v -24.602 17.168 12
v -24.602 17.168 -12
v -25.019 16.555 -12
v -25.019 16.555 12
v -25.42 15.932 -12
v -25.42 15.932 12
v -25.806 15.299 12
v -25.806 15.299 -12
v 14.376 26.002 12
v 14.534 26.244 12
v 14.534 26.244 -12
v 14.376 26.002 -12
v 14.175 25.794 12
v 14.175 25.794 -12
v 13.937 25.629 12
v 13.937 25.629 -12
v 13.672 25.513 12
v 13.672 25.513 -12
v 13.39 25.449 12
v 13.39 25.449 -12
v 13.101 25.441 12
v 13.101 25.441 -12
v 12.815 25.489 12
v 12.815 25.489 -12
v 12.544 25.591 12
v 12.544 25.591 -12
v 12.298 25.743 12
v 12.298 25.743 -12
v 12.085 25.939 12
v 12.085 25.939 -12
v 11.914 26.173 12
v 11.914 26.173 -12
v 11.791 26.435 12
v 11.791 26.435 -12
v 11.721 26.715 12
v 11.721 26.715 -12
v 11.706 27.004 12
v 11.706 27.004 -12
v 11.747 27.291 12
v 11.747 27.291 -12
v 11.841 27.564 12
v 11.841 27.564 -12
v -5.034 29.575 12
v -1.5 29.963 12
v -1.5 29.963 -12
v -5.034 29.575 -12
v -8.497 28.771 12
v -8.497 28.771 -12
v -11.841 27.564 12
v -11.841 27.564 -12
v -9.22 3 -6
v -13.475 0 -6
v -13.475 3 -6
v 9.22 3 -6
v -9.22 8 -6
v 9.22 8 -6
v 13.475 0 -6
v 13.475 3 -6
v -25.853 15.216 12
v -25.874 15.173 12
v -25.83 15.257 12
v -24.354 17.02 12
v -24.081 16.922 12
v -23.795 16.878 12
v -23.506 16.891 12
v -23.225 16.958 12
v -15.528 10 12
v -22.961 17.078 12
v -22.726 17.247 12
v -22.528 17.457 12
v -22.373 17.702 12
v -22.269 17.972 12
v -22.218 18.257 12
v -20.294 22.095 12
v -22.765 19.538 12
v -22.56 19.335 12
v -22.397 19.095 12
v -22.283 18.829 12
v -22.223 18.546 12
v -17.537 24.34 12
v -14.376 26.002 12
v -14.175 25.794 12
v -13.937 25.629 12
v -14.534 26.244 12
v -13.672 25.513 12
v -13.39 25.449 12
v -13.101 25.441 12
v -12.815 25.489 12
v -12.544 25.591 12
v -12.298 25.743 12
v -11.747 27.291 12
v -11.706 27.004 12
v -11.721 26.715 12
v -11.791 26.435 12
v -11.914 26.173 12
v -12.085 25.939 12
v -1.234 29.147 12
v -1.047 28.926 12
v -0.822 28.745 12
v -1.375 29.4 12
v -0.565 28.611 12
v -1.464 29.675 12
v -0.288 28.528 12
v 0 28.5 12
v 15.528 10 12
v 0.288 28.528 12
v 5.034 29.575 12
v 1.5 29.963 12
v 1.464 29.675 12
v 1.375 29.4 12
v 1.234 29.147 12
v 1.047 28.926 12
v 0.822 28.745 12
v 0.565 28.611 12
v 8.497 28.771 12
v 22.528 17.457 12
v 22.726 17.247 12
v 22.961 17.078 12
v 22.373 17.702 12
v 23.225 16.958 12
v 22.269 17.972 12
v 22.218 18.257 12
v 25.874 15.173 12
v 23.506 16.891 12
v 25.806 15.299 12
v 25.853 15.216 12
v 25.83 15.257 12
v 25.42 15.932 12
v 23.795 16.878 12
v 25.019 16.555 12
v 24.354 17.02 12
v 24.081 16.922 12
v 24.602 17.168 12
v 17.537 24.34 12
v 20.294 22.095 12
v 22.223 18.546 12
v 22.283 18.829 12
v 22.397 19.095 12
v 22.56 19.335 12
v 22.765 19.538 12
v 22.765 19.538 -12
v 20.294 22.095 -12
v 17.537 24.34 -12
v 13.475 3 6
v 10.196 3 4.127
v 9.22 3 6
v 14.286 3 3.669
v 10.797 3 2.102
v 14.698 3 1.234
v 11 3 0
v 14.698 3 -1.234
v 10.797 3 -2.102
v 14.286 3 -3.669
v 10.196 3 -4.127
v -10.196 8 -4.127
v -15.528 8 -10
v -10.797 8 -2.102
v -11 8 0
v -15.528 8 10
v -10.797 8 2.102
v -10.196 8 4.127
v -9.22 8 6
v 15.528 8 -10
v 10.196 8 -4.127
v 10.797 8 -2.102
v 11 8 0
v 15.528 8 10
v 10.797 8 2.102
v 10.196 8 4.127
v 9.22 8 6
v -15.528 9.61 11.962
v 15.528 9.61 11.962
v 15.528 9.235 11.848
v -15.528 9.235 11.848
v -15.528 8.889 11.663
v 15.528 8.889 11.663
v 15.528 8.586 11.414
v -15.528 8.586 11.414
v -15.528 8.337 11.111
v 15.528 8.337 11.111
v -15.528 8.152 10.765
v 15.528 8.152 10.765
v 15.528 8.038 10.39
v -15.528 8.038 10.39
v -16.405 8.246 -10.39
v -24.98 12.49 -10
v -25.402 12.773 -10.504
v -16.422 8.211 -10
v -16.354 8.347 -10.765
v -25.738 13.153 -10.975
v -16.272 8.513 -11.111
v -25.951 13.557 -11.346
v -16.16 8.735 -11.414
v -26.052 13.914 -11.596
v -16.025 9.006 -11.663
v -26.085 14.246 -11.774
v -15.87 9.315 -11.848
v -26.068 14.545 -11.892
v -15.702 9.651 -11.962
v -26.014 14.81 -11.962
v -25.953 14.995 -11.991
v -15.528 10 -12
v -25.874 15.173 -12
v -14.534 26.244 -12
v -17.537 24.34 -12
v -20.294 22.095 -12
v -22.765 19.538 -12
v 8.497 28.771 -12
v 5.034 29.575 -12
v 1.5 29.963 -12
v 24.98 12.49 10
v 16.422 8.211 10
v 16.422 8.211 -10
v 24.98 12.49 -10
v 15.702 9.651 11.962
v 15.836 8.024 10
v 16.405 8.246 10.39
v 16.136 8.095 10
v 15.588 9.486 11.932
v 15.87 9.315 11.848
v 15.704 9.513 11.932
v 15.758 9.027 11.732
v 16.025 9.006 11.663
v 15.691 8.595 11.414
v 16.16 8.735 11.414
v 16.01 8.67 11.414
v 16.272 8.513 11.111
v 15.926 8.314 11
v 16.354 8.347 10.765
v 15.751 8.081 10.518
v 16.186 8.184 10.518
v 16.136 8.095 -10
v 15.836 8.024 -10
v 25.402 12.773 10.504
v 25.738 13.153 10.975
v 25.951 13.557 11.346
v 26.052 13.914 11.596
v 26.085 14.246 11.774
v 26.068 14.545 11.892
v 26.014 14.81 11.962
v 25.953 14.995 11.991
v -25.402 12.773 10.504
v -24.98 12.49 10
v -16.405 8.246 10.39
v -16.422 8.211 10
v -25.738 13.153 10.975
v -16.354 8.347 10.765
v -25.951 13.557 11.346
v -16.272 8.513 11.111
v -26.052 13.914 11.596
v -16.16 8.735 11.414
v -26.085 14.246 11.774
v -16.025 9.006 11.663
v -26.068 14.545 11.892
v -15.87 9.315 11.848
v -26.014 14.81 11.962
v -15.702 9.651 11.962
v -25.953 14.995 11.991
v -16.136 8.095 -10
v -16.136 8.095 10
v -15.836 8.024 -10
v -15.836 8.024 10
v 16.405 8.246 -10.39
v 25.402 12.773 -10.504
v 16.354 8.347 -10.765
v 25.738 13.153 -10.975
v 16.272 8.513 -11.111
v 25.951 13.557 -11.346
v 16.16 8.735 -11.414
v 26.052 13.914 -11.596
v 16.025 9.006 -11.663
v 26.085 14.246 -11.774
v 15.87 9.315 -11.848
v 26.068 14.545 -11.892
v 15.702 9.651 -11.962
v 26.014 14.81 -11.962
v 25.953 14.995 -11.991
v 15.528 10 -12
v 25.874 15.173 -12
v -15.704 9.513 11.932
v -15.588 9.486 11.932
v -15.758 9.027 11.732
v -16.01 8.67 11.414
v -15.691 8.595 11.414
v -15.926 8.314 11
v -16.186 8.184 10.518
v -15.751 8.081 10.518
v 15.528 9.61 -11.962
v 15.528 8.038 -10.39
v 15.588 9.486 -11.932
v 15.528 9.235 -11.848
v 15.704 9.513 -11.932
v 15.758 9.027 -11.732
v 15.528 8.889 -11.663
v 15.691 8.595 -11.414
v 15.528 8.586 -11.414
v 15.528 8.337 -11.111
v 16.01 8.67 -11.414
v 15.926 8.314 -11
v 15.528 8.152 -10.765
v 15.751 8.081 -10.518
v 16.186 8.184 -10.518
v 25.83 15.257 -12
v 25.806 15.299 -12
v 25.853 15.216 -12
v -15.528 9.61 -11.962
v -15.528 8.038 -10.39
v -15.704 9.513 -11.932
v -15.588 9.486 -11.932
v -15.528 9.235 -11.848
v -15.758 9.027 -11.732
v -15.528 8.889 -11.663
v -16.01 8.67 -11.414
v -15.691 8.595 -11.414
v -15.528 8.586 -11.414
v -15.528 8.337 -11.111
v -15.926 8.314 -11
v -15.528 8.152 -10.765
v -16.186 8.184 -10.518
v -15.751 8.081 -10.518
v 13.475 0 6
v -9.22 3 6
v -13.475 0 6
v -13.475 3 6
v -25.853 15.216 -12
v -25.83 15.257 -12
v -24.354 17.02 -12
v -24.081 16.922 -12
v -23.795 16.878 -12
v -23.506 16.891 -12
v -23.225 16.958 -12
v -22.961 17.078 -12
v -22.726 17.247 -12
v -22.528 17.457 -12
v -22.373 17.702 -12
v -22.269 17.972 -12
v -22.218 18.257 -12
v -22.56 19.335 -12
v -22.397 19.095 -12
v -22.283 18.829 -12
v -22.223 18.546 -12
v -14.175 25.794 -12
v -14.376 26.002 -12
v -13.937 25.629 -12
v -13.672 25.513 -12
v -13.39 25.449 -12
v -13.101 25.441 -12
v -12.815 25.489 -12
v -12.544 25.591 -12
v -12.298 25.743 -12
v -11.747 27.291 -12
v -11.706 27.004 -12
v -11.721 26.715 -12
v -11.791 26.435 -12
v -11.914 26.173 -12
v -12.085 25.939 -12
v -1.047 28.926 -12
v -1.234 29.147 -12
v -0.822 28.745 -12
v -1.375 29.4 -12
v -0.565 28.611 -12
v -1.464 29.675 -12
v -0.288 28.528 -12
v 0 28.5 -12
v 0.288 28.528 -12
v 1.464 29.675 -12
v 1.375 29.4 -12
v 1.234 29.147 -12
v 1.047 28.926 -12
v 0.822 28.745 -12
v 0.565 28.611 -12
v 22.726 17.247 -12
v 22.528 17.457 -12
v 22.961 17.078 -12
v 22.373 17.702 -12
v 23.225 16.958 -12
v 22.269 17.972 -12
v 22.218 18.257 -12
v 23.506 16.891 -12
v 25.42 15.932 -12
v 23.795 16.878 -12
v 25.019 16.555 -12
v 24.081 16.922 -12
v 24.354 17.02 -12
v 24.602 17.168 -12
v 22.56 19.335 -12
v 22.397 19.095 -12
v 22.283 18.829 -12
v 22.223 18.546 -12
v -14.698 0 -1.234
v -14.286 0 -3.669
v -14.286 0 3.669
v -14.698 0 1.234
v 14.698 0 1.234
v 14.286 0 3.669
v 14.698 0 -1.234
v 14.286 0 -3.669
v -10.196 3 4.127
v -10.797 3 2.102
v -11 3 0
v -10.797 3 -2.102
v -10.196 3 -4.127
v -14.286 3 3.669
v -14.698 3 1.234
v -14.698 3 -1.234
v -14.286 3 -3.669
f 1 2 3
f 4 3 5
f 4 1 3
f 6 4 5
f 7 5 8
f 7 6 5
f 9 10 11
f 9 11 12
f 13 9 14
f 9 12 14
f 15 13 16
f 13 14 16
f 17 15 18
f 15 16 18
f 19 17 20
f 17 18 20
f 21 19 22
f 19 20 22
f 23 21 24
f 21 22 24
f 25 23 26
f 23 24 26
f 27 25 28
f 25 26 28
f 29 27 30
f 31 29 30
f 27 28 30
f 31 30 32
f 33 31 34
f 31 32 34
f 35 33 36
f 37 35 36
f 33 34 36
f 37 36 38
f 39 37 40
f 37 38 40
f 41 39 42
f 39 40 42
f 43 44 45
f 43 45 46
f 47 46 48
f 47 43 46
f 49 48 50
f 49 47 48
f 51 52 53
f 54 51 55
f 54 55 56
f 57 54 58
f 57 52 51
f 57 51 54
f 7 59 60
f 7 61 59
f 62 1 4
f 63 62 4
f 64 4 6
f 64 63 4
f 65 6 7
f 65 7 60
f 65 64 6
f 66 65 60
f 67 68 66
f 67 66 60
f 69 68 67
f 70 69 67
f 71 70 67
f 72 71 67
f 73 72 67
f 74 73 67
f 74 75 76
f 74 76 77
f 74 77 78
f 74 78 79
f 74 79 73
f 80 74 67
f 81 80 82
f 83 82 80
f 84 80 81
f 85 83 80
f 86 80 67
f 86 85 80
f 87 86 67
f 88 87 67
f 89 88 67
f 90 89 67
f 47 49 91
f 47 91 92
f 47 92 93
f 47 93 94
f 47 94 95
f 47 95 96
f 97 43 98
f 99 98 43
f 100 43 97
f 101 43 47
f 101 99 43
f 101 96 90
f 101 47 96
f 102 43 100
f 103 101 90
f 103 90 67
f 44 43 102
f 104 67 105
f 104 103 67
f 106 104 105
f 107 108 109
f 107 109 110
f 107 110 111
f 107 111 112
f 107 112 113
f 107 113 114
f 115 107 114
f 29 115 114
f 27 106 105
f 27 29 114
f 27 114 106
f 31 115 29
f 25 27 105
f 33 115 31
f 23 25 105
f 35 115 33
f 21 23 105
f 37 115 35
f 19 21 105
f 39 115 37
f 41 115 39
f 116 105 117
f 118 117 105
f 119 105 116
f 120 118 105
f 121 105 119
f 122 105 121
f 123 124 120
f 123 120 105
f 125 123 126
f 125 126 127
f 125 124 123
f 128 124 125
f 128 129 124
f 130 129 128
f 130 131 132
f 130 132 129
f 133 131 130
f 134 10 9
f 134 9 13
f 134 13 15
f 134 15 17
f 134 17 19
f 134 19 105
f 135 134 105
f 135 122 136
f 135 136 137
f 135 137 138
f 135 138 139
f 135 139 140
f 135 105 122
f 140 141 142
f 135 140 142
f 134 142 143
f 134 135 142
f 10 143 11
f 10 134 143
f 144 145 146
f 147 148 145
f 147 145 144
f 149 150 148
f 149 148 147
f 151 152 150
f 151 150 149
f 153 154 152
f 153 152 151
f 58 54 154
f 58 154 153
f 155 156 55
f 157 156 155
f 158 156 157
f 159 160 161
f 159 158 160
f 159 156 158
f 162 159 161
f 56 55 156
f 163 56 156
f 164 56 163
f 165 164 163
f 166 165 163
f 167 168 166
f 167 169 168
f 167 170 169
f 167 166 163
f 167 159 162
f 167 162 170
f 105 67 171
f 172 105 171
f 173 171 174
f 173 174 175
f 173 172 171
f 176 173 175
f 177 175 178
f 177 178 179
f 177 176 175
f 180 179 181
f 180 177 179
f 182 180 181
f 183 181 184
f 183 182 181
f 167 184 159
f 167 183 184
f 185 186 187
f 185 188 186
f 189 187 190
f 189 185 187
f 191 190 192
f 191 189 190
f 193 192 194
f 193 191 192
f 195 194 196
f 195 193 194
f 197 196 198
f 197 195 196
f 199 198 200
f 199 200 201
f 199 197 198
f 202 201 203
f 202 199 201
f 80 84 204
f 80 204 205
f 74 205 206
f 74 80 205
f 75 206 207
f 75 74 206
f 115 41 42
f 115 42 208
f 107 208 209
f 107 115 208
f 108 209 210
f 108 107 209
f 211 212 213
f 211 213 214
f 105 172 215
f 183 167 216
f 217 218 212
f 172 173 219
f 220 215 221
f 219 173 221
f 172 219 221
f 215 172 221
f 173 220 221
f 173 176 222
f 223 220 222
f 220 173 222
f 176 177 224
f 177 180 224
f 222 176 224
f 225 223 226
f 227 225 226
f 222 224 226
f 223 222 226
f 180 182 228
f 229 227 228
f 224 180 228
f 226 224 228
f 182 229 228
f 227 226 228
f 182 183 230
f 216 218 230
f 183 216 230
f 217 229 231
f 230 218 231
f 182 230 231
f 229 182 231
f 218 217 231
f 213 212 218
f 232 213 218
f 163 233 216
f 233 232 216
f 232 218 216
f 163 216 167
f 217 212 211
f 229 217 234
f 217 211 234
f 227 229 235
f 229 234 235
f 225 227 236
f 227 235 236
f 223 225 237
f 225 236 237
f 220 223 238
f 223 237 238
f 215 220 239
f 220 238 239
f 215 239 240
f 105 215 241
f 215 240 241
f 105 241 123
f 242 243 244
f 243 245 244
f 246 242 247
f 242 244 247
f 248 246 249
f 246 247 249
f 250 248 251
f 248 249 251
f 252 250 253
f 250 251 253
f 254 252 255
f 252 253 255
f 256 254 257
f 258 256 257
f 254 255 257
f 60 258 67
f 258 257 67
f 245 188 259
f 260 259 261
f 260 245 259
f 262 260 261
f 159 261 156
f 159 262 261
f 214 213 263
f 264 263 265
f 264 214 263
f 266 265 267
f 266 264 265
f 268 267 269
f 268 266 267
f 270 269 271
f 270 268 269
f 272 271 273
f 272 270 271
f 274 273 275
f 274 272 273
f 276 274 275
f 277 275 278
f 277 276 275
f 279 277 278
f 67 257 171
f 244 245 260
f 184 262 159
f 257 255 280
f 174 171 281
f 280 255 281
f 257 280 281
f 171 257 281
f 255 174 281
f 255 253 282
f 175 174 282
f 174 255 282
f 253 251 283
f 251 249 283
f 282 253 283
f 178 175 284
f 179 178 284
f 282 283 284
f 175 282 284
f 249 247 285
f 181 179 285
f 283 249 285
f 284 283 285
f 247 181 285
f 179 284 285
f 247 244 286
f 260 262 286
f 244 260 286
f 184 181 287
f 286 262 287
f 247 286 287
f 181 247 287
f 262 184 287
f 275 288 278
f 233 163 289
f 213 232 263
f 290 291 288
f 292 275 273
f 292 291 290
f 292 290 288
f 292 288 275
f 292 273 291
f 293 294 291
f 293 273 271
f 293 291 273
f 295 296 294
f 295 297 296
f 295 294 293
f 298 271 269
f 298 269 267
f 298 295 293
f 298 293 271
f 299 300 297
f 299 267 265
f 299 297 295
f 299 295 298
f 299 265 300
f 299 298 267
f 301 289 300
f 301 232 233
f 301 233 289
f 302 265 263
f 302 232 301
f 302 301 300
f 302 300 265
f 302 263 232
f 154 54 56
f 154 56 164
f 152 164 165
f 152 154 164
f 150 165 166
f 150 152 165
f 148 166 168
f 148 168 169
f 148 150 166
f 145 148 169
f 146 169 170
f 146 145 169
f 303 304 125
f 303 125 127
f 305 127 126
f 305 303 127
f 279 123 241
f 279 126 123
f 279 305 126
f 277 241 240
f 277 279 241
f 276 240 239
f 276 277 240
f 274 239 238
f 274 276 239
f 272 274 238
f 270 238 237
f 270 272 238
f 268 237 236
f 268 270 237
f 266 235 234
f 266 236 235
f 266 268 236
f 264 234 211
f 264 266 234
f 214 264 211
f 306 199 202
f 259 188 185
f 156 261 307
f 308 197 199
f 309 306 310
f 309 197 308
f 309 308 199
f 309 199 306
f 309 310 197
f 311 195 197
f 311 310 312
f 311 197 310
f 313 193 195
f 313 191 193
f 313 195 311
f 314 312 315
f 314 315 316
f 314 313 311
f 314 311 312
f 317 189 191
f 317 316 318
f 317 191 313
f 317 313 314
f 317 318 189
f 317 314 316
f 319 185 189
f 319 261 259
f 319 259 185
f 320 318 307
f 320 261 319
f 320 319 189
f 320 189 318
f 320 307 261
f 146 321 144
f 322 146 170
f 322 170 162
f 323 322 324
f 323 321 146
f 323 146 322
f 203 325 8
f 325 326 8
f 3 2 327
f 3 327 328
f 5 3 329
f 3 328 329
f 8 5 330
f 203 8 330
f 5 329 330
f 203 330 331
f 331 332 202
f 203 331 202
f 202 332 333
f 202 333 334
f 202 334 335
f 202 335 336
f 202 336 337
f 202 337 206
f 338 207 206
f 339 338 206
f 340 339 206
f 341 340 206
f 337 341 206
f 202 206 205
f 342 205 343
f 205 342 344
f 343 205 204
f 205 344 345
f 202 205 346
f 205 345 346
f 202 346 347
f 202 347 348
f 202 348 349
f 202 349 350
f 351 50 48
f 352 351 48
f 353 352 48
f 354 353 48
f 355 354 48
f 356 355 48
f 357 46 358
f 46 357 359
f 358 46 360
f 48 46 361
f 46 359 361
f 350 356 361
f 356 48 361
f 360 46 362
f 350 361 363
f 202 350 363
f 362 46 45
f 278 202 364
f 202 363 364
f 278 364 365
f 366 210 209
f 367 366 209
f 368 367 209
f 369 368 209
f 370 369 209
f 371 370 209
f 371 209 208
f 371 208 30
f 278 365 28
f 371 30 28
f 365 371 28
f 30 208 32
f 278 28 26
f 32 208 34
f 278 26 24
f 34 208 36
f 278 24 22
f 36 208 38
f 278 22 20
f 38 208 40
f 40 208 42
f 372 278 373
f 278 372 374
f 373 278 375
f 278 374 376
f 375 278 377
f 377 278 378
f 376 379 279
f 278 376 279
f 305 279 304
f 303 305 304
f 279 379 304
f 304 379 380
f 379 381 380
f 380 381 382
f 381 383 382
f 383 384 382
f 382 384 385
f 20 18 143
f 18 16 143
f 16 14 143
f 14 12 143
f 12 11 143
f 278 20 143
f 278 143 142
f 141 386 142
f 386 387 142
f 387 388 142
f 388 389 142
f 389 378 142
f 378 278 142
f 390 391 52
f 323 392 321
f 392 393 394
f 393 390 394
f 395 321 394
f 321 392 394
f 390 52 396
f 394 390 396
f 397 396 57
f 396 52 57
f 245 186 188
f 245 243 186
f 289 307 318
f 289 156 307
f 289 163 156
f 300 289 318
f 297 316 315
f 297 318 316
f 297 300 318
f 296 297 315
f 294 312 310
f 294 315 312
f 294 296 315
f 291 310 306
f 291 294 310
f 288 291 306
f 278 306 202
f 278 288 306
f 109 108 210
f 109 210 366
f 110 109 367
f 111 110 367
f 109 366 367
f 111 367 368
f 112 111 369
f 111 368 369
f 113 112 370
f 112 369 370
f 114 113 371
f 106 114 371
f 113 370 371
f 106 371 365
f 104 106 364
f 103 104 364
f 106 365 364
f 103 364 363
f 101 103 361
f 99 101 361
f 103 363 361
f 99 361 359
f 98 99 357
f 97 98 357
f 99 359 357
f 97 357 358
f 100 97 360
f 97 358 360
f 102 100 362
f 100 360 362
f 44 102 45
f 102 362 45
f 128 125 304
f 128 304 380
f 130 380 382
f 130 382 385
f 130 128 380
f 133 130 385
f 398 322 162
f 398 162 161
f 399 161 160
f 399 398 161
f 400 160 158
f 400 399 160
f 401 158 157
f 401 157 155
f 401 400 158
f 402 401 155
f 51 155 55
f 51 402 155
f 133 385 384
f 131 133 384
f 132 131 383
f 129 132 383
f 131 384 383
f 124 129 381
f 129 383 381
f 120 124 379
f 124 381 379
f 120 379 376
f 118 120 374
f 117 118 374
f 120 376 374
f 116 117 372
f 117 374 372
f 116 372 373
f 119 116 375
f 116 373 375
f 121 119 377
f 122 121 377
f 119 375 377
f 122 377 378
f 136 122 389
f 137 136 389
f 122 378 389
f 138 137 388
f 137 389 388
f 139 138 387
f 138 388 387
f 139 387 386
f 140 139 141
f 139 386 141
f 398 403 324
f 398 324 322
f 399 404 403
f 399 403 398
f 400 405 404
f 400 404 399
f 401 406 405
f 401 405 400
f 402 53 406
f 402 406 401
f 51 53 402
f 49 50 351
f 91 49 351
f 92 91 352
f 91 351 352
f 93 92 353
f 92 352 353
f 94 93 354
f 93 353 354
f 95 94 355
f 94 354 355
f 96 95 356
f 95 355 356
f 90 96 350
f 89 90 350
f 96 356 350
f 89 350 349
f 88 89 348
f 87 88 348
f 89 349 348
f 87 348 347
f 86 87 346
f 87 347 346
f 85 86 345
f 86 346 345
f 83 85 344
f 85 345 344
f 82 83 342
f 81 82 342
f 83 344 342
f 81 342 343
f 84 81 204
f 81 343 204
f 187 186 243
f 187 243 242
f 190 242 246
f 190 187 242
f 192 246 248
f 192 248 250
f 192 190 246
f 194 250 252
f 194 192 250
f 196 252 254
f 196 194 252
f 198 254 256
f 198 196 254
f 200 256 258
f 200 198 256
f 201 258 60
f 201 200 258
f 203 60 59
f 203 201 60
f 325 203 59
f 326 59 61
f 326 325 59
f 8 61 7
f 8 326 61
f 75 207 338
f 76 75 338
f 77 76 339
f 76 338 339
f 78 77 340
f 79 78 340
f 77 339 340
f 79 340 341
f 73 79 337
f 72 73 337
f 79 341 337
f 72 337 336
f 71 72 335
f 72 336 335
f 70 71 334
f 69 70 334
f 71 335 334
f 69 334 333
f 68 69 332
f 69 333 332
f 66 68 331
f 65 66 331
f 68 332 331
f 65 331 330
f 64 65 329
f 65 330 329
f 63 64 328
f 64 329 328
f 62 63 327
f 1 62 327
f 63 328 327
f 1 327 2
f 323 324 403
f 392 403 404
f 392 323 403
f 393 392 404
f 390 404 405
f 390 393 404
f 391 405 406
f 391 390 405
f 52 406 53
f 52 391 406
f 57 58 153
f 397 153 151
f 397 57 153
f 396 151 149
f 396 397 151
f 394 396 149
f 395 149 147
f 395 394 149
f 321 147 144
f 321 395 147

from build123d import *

# Parameters (mm, degrees)
SKETCH1_W           = 29.5
SKETCH1_H           = 12
BOSS_EXTRUDE1_DEPTH = 3
BOSS_EXTRUDE7_DEPTH = 12
BOSS_EXTRUDE8_DEPTH = 5
SKETCH16_R          = 1.5
CUT_EXTRUDE11_DEPTH = 24
FILLET5_R           = 2
SKETCH17_OUTSIDE_W  = 67.126
SKETCH17_OUTSIDE_H  = 38.954
SKETCH17_OUTSIDE_R  = 14.75
CUT_EXTRUDE12_DEPTH = 3


with BuildPart() as part:
    # Sketch1 → Boss-Extrude1 (new body)
    with BuildSketch(Plane(origin=(0, 0, 0), x_dir=(1, 0, 0), z_dir=(0, 1, 0))):
        Rectangle(SKETCH1_W, SKETCH1_H)
    extrude(amount=BOSS_EXTRUDE1_DEPTH)



with BuildPart() as body_2:
    # Sketch14 → Boss-Extrude7 (new body, symmetric)
    with BuildSketch(Plane.XY):
        with BuildLine():
            Line((-26.83281573, 13.416407865), (-16, 8))
            Line((-16, 8), (16, 8))
            Line((16, 8), (26.83281573, 13.416407865))
            ThreePointArc((26.83281573, 13.416407865), (0, 30), (-26.83281573, 13.416407865))
        make_face()
    extrude(amount=BOSS_EXTRUDE7_DEPTH, both=True)


with BuildPart() as part_1:
    add(part.part)

    add(body_2.part)  # Boss-Extrude8 merges body 2
    # Sketch15 → Boss-Extrude8 (add)
    with BuildSketch(Plane(origin=(0, 3, 0), x_dir=(-1, 0, 0), z_dir=(0, 1, 0))):
        with BuildLine():
            Line((-9.219544457, 6), (9.219544457, 6))
            ThreePointArc((9.219544457, 6), (11, 0), (9.219544457, -6))
            Line((9.219544457, -6), (-9.219544457, -6))
            ThreePointArc((-9.219544457, -6), (-11, 0), (-9.219544457, 6))
        make_face()
    extrude(amount=BOSS_EXTRUDE8_DEPTH)

    # Sketch16 → Cut-Extrude11 (cut)
    with BuildSketch(Plane(origin=(0, 0, -12), x_dir=(-1, 0, 0), z_dir=(0, 0, -1))):
        with Locations((-23.713219718, 18.376158756)):
            Circle(SKETCH16_R)
        with Locations((-13.204454501, 26.937750117)):
            Circle(SKETCH16_R)
        with Locations((0, 30)):
            Circle(SKETCH16_R)
        with Locations((13.204454501, 26.937750117)):
            Circle(SKETCH16_R)
        with Locations((23.713219718, 18.376158756)):
            Circle(SKETCH16_R)
    extrude(amount=-CUT_EXTRUDE11_DEPTH, mode=Mode.SUBTRACT)

    # Fillet5
    fillet5_edges = [part_1.edges().sort_by_distance(p)[0] for p in [
        (26.83281573, 13.416407865, 0),
        (-21.416407865, 10.708203932, -12),
        (-26.83281573, 13.416407865, 0),
        (0, 8, -12),
        (-16, 8, 0),
        (21.416407865, 10.708203932, -12),
        (16, 8, 0),
        (-21.416407865, 10.708203932, 12),
        (0, 8, 12),
        (21.416407865, 10.708203932, 12),
    ]]
    fillet(fillet5_edges, radius=FILLET5_R)

    # Sketch17 outside → Cut-Extrude12 (cut)
    with BuildSketch(Plane.XZ):
        Rectangle(SKETCH17_OUTSIDE_W, SKETCH17_OUTSIDE_H)
        Circle(SKETCH17_OUTSIDE_R, mode=Mode.SUBTRACT)
    extrude(amount=-CUT_EXTRUDE12_DEPTH, mode=Mode.SUBTRACT)


solid = part_1.part
